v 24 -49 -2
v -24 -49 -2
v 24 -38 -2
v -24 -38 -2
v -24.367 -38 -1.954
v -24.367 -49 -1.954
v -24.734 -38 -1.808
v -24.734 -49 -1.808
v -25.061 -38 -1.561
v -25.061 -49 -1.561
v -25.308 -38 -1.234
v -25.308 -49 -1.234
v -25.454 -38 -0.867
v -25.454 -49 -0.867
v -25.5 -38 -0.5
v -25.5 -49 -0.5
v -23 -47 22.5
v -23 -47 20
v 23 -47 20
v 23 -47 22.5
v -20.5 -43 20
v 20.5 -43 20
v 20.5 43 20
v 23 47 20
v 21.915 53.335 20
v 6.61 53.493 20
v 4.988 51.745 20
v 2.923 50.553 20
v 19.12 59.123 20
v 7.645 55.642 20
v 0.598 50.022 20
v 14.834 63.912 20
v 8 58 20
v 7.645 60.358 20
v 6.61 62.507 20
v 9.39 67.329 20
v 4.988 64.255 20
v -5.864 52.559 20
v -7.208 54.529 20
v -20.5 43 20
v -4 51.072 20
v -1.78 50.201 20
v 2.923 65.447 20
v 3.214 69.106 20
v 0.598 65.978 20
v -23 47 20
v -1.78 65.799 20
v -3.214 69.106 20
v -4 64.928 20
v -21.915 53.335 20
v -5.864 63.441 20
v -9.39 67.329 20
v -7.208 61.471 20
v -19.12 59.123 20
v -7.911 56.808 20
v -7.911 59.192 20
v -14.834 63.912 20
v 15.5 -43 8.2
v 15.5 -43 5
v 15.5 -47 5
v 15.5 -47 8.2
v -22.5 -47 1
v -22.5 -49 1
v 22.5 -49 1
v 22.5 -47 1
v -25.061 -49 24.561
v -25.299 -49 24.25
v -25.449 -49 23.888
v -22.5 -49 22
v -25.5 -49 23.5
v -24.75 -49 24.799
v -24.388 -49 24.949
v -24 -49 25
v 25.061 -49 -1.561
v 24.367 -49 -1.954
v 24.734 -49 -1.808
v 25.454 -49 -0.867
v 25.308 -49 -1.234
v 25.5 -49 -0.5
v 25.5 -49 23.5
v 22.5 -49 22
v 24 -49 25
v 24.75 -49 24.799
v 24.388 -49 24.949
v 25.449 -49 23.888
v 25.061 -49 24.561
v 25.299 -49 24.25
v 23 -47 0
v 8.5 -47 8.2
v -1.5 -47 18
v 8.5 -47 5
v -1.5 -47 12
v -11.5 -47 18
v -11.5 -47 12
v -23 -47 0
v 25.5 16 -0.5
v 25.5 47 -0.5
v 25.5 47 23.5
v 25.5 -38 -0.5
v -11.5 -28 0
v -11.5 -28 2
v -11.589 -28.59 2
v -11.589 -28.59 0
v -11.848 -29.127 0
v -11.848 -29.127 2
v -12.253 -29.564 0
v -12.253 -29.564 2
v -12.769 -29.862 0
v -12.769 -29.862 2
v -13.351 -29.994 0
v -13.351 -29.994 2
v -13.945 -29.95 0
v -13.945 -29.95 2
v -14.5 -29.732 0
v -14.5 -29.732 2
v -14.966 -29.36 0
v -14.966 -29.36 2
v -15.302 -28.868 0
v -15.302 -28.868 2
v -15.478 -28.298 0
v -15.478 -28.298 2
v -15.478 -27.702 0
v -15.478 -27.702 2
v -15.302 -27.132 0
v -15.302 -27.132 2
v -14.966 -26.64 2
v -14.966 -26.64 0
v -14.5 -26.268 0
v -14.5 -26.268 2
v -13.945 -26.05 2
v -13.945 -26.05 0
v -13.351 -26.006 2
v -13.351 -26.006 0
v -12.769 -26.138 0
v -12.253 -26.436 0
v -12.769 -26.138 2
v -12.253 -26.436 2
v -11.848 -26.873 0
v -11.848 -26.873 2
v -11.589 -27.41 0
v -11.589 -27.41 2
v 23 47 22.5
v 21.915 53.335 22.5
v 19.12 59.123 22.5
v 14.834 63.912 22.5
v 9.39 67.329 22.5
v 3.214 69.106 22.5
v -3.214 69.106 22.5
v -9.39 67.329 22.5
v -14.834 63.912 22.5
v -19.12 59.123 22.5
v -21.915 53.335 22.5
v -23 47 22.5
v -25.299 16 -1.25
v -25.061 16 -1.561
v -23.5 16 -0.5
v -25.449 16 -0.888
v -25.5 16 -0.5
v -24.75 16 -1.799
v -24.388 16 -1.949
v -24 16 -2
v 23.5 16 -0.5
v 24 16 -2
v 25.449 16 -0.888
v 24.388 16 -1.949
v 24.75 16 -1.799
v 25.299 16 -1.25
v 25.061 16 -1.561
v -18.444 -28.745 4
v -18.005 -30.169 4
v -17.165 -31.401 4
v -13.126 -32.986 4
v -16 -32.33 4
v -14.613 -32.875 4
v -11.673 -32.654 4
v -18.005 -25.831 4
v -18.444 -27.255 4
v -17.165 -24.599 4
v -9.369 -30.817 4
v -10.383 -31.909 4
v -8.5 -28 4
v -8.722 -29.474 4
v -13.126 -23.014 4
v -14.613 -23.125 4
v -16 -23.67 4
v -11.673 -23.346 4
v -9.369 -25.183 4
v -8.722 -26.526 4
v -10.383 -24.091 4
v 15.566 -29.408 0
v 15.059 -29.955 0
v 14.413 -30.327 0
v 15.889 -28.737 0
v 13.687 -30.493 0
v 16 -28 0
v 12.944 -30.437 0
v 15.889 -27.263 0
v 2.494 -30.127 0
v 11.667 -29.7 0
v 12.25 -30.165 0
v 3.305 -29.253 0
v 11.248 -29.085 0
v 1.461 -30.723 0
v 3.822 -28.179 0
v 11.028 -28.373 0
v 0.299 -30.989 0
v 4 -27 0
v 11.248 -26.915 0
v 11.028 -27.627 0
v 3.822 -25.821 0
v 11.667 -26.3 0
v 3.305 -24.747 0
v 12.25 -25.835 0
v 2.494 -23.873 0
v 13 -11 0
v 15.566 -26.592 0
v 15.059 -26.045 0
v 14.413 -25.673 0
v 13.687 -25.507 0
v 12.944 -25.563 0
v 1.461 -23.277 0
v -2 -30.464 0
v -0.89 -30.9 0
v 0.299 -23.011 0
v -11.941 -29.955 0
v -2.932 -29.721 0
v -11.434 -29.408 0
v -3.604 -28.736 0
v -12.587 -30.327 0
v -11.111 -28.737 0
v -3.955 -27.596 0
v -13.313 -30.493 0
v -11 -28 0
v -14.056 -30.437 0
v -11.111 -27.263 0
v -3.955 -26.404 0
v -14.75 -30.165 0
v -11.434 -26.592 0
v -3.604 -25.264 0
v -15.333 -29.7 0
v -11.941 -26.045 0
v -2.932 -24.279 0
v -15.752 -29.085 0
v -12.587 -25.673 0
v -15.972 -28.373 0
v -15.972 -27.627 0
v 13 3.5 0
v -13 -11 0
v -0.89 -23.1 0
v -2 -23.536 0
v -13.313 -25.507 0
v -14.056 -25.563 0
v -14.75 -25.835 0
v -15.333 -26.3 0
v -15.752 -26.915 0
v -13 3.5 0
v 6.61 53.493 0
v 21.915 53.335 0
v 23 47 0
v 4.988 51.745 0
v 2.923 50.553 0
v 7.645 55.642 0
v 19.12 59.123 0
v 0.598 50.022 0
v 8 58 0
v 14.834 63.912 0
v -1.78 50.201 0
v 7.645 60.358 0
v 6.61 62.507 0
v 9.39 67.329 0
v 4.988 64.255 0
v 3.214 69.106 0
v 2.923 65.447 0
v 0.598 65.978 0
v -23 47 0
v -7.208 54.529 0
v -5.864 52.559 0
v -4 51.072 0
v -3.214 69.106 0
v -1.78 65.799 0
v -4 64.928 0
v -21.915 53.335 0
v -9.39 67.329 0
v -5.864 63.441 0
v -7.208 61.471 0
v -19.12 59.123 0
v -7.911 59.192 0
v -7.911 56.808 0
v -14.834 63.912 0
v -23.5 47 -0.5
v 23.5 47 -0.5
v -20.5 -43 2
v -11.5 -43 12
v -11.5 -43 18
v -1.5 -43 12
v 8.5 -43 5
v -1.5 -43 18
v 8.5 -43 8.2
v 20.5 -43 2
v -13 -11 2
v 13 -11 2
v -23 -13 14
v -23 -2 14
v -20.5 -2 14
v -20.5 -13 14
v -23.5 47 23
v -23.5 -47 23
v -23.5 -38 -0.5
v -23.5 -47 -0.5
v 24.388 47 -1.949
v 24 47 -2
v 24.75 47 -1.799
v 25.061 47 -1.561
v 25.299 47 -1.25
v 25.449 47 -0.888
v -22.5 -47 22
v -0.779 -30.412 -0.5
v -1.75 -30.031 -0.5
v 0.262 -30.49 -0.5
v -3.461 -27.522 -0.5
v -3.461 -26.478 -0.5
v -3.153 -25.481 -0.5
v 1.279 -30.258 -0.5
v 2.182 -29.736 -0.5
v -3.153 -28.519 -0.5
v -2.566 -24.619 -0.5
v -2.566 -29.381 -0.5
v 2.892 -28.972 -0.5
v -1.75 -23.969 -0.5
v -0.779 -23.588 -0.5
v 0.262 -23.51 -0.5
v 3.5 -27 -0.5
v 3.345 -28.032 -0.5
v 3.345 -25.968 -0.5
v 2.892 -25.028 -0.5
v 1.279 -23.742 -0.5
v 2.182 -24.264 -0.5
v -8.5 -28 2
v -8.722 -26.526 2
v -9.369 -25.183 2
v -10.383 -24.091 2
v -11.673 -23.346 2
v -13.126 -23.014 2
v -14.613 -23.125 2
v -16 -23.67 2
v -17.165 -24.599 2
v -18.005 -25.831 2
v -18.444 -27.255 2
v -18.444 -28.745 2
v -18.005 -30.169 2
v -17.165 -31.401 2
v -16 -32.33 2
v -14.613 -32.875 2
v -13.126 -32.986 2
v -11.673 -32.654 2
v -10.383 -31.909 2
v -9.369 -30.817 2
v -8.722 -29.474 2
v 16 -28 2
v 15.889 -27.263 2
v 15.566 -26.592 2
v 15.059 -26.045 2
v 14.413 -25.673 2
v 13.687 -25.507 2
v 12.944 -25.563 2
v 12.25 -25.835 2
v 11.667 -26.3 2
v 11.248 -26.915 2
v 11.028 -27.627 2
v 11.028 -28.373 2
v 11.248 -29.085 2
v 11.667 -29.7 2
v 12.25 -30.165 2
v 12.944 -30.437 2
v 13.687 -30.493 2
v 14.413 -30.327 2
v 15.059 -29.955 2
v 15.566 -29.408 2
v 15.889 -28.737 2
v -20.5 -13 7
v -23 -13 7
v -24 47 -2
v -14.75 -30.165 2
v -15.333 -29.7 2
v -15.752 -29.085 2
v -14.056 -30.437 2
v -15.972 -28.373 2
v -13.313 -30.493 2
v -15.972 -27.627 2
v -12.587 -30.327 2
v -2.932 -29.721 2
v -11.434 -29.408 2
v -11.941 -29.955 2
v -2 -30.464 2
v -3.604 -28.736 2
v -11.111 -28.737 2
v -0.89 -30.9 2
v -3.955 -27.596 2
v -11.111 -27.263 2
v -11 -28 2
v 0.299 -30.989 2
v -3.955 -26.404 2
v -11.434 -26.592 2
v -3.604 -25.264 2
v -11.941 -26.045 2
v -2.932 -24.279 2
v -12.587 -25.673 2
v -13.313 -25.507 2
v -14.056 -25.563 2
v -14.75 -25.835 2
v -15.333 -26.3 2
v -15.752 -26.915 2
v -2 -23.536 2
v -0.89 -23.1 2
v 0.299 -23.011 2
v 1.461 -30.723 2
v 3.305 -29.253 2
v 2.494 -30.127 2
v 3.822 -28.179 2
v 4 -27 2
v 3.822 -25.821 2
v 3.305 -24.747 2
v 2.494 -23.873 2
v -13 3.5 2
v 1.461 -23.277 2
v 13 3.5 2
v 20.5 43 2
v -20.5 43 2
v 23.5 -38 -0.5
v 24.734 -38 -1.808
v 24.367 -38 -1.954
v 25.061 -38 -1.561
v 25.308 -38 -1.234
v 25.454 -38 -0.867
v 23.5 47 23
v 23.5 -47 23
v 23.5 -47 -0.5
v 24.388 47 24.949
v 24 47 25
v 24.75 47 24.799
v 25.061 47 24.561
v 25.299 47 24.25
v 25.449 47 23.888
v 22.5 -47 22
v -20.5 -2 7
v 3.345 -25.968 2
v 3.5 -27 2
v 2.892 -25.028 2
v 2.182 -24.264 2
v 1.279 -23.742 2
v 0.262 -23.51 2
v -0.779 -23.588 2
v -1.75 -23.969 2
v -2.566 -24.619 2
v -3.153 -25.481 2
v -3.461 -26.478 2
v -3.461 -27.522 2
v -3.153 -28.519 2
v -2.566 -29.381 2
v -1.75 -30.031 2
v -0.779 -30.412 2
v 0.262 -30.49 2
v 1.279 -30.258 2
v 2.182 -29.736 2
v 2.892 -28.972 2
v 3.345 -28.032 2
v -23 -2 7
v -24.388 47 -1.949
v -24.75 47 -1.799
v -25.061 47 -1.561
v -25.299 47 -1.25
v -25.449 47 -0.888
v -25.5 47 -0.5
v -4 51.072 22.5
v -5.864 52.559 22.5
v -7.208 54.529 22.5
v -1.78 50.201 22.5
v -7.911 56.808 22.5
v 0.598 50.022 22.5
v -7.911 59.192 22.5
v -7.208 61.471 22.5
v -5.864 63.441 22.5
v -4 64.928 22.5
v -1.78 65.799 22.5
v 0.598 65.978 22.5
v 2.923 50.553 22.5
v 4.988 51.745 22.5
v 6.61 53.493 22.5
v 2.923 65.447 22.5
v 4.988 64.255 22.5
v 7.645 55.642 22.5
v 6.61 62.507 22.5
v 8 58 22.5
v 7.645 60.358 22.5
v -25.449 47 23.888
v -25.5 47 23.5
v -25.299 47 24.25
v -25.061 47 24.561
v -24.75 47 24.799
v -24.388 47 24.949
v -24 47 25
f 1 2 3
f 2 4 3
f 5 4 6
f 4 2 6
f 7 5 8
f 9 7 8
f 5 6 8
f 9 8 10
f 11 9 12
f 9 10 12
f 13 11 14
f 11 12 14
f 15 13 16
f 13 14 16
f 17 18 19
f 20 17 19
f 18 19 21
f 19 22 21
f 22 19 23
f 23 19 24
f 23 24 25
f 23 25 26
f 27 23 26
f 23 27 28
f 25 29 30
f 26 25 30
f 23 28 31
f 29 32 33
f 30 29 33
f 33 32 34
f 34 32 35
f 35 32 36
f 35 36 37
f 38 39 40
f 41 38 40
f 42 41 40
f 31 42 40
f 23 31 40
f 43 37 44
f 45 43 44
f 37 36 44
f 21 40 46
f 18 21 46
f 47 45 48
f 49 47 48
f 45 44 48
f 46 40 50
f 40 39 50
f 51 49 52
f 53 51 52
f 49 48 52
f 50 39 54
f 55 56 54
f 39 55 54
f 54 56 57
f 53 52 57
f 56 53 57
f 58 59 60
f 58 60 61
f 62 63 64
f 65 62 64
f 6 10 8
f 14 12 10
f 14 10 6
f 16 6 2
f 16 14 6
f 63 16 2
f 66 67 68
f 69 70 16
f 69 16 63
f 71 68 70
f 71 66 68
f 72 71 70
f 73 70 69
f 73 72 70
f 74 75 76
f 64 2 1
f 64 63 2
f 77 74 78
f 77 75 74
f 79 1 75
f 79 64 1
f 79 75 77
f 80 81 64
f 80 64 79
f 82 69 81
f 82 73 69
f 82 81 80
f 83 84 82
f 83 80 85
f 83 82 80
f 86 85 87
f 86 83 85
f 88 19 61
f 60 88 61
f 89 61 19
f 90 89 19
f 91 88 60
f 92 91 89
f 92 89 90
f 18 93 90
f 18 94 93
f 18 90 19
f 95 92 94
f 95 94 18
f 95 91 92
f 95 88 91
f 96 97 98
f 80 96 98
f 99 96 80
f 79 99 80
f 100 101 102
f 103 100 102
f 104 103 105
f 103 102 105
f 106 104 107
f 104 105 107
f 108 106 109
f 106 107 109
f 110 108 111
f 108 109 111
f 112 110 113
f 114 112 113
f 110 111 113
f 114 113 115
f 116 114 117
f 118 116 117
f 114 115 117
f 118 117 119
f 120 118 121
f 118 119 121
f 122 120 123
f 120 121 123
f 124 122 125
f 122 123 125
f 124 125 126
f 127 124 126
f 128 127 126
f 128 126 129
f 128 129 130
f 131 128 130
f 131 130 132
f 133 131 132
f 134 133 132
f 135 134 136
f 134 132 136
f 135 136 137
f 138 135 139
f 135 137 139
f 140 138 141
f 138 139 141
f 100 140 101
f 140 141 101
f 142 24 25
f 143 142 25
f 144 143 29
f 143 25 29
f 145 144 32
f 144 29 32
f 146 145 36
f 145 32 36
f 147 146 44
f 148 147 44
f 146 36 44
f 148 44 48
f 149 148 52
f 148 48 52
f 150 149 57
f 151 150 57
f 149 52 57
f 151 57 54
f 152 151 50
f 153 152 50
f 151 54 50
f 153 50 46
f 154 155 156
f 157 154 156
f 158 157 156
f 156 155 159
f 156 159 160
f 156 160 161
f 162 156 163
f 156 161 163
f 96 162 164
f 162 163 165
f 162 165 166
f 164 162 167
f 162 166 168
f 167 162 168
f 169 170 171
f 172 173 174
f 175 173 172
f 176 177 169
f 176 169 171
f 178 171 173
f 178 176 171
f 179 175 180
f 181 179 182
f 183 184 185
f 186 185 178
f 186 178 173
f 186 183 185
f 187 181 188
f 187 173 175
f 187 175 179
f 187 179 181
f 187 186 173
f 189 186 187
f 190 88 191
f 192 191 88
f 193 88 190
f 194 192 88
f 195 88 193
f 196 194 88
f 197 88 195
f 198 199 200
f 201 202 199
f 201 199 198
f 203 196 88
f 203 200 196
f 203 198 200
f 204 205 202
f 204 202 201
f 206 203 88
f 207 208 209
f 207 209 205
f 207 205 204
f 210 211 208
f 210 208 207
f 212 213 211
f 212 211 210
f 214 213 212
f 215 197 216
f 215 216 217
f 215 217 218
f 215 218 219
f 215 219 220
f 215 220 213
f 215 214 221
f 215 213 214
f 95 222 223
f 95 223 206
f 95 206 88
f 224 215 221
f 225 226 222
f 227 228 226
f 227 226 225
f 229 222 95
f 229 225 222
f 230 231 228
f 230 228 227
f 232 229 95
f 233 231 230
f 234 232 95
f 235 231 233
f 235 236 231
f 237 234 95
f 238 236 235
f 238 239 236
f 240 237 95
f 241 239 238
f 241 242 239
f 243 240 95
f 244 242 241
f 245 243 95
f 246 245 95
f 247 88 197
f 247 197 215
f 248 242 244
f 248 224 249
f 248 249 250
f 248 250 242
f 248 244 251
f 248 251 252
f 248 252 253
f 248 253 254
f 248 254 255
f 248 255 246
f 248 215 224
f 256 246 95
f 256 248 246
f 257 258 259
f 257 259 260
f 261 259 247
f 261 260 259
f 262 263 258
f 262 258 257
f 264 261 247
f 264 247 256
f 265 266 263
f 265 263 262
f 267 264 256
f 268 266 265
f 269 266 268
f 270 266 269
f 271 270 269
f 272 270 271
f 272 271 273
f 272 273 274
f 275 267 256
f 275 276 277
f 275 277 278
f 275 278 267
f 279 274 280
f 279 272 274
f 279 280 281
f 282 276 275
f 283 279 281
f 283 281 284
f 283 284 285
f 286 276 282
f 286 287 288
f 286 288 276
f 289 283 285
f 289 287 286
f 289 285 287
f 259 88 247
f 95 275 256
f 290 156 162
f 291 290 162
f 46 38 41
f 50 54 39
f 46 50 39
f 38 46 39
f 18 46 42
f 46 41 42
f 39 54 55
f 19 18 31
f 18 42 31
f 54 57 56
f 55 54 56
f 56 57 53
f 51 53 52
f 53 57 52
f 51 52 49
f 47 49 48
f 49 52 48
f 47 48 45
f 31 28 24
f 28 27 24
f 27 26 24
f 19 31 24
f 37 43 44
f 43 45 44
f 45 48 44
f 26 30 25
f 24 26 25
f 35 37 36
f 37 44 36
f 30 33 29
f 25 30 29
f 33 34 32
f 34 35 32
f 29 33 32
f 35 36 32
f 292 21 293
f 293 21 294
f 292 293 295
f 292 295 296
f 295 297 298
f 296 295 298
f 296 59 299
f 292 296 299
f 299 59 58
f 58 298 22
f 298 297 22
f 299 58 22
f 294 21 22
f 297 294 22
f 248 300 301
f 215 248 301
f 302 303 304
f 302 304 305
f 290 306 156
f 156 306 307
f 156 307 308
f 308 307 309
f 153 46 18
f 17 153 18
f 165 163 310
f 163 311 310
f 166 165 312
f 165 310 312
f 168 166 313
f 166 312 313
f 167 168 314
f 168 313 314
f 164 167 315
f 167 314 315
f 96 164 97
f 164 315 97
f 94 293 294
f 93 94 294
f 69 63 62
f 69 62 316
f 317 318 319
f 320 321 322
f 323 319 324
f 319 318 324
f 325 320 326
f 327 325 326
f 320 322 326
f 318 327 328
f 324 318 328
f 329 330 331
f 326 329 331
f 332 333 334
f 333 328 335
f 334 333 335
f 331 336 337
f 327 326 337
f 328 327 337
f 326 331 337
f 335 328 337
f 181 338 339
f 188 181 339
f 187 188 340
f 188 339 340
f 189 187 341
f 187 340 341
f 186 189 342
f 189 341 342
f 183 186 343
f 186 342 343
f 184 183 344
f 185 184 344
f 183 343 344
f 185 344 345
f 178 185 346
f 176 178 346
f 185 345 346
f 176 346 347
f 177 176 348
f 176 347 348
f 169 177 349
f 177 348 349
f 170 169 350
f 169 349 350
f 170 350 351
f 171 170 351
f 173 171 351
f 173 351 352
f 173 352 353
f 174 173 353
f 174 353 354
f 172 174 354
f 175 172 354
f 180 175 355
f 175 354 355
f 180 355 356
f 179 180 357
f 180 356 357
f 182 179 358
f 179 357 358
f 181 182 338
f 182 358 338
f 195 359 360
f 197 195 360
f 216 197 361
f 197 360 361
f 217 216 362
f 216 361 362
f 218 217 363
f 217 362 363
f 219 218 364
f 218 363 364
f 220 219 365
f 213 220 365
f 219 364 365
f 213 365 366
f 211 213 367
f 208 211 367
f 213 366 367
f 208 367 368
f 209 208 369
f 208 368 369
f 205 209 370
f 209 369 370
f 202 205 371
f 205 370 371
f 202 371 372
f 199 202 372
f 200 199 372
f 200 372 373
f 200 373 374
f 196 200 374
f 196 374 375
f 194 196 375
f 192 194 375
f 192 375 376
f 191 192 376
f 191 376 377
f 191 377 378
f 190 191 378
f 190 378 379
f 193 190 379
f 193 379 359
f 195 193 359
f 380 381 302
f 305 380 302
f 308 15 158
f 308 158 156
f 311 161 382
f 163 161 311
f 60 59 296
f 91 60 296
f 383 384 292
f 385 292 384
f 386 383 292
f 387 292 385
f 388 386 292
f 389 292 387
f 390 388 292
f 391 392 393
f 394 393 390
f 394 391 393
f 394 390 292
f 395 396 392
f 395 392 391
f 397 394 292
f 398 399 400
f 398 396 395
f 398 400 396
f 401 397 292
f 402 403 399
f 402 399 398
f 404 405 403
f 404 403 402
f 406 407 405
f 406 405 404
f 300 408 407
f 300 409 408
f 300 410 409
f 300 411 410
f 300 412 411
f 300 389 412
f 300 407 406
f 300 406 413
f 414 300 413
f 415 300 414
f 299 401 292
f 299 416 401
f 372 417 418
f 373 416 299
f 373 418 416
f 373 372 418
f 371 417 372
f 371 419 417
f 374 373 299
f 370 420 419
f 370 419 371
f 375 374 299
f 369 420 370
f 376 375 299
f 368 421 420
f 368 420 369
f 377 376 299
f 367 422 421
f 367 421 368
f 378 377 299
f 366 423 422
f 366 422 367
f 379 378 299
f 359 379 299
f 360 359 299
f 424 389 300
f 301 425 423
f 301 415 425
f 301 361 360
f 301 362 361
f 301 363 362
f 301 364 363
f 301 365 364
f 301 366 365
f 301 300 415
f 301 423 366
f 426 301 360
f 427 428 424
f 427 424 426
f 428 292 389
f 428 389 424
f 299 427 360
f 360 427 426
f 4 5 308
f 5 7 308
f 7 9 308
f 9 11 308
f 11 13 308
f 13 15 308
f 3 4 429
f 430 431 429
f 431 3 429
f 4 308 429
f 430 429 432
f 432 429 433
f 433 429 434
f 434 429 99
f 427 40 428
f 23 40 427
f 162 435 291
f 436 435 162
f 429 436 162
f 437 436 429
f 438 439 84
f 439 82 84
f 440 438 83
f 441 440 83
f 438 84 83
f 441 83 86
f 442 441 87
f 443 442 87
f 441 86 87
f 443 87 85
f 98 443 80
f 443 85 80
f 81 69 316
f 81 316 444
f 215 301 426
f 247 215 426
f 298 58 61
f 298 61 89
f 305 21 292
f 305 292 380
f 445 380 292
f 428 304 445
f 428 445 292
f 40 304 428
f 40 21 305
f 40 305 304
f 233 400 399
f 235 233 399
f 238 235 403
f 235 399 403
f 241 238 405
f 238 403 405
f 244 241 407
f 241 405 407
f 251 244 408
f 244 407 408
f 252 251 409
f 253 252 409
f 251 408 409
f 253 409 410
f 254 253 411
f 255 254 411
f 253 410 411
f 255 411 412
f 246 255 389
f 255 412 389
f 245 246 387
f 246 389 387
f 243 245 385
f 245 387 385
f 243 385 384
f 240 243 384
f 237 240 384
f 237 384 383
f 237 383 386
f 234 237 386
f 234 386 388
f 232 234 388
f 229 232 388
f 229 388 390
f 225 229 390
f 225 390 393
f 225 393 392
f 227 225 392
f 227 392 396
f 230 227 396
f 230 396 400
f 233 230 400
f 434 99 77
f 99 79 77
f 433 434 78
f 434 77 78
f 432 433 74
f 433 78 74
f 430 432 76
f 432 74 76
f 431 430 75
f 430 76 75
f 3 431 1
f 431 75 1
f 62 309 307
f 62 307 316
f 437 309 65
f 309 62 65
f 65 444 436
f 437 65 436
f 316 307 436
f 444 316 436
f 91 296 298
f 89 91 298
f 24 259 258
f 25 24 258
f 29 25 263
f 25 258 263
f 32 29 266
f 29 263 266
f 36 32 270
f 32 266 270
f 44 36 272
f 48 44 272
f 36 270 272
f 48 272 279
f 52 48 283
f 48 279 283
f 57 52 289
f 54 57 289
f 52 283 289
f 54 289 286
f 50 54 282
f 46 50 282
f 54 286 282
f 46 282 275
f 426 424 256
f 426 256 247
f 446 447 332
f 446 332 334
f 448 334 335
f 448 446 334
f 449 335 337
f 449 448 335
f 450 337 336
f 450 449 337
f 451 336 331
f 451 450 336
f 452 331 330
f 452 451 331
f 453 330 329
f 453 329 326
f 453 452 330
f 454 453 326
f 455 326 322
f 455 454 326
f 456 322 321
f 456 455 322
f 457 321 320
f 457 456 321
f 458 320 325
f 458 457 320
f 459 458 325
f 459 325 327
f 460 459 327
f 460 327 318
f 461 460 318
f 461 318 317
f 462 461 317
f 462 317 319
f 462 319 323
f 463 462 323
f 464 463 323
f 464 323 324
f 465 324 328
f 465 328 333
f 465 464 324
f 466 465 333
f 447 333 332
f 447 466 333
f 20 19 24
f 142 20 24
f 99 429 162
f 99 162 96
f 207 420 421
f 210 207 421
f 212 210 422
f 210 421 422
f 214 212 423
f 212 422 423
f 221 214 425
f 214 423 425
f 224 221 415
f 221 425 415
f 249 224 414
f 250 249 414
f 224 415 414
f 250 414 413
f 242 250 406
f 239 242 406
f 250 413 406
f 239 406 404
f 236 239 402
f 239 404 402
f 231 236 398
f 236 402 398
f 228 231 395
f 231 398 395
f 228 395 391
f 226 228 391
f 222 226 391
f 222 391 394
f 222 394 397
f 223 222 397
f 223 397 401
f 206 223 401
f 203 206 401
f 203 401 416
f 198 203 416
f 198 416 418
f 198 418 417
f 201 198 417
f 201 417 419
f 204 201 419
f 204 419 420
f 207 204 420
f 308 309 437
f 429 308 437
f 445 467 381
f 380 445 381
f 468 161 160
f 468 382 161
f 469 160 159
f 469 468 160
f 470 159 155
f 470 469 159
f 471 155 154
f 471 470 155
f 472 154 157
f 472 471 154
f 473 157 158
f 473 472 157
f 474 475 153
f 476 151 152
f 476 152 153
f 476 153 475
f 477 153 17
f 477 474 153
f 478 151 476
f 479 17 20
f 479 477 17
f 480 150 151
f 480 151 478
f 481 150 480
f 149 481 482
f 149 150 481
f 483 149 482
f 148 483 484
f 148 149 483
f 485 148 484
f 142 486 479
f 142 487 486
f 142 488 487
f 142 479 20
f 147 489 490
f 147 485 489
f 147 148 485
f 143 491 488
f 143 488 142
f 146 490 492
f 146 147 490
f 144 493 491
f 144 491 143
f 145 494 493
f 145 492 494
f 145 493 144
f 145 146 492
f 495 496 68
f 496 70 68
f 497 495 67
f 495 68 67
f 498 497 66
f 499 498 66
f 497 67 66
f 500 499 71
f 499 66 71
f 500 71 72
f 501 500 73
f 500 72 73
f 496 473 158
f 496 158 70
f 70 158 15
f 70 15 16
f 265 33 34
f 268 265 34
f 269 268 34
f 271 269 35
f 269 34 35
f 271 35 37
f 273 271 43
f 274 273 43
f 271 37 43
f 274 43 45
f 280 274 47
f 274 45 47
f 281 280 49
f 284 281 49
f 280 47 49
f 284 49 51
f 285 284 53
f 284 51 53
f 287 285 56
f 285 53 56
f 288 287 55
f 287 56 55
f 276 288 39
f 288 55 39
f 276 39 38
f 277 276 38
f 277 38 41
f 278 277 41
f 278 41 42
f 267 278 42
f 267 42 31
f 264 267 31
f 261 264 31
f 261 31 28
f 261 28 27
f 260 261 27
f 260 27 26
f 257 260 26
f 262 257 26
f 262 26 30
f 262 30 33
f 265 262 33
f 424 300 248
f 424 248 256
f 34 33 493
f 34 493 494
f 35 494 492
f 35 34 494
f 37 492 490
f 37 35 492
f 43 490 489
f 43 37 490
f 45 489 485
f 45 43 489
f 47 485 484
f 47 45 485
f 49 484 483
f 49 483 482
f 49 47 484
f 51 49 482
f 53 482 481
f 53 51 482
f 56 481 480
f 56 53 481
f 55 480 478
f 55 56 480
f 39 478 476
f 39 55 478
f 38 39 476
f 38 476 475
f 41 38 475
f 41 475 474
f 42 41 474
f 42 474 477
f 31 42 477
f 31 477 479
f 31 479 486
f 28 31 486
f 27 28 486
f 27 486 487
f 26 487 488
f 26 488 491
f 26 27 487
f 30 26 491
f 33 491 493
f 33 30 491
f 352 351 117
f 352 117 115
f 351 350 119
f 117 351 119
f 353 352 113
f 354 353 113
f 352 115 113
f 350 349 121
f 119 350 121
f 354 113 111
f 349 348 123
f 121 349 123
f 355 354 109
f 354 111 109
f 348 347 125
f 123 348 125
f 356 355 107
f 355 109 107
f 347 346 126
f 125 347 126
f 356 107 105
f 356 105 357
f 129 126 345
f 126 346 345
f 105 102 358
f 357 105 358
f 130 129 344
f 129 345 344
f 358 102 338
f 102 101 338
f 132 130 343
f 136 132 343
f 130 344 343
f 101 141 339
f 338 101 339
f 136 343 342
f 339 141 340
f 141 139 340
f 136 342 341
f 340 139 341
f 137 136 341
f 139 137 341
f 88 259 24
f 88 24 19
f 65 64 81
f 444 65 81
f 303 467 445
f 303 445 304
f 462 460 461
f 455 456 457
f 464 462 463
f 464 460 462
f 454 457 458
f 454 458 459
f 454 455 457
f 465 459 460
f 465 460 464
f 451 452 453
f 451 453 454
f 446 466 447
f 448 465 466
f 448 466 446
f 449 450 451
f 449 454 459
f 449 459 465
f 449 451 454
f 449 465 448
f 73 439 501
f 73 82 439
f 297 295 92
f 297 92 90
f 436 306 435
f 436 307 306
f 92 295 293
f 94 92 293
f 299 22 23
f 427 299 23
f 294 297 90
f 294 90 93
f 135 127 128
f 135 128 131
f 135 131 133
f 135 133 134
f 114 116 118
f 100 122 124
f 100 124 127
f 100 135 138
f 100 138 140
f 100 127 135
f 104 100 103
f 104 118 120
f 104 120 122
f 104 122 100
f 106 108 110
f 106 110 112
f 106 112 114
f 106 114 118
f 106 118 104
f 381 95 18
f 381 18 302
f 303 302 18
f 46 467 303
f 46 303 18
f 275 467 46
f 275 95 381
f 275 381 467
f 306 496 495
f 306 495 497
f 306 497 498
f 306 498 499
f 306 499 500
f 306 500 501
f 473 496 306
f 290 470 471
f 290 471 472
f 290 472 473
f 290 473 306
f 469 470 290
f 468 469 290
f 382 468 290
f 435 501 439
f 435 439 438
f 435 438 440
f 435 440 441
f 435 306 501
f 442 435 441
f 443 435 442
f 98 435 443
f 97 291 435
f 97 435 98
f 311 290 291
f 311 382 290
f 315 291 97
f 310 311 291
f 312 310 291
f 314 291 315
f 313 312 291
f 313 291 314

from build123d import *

# Parameters (mm, degrees)
PAD_DEPTH       = 20
SKETCH001_R     = 8
POCKET_DEPTH    = 20.001
SKETCH002_W     = 41
SKETCH002_H     = 86
POCKET001_DEPTH = 18
SKETCH003_W     = 26
SKETCH003_H     = 14.5
POCKET002_DEPTH = 5
SKETCH004_R     = 4
POCKET003_DEPTH = 5
SKETCH005_W     = 7
SKETCH005_H     = 3.2
POCKET004_DEPTH = 4.001
SKETCH006_W     = 10
SKETCH006_H     = 6
POCKET005_DEPTH = 4.001
SKETCH007_R     = 2.5
POCKET006_DEPTH = 2.001
SKETCH012_R     = 2.5
POCKET007_DEPTH = 2.001
SKETCH013_W     = 11
SKETCH013_H     = 7
POCKET008_DEPTH = 2.5
SKETCH008_R     = 5
PAD001_DEPTH    = 2
SKETCH009_R     = 2
PAD002_DEPTH    = 2
SKETCH010_R     = 3.5
PAD003_DEPTH    = 2.5
SKETCH014_R     = 8
PAD005_DEPTH    = 2.5
SKETCH015_W     = 51
SKETCH015_H     = 27
SKETCH015_W_2   = 47
SKETCH015_H_2   = 23.5
PAD006_DEPTH    = 9
SKETCH016_W     = 51
SKETCH016_H     = 27
PAD007_DEPTH    = 2
SKETCH017_W     = 2
SKETCH017_H     = 23.5
PAD008_DEPTH    = 54
SKETCH018_W     = 51
SKETCH018_H     = 27
SKETCH018_W_2   = 47
SKETCH018_H_2   = 23.5
PAD009_DEPTH    = 31
SKETCH019_W     = 51
SKETCH019_H     = 54
PAD010_DEPTH    = 2
SKETCH020_W     = 45
SKETCH020_H     = 21
POCKET009_DEPTH = 5
FILLET_R        = 1.5
FILLET001_R     = 1.5
FILLET002_R     = 1.5
FILLET003_R     = 1.5
FILLET004_R     = 1.5
FILLET005_R     = 1.5


with BuildPart() as body:
    # Sketch → Pad (new body)
    with BuildSketch(Plane.XY):
        with BuildLine():
            Line((23, 47), (23, -47))
            Line((23, -47), (-23, -47))
            Line((-23, -47), (-23, 47))
            ThreePointArc((23, 47), (0, 69.331693), (-23, 47))
        make_face()
    extrude(amount=PAD_DEPTH)

    # Sketch001 (on Face6 of Pad) → Pocket (cut, through all)
    with BuildSketch(Plane.XY.offset(20)):
        with Locations((0, 58)):
            Circle(SKETCH001_R)
    extrude(amount=-POCKET_DEPTH, mode=Mode.SUBTRACT)

    # Sketch002 (on Face5 of Pocket) → Pocket001 (cut)
    with BuildSketch(Plane.XY.offset(20)):
        Rectangle(SKETCH002_W, SKETCH002_H)
    extrude(amount=-POCKET001_DEPTH, mode=Mode.SUBTRACT)

    # Sketch003 (on Face12 of Pocket001) → Pocket002 (cut)
    with BuildSketch(Plane.XY.offset(2)):
        with Locations((0, -3.75)):
            Rectangle(SKETCH003_W, SKETCH003_H)
    extrude(amount=-POCKET002_DEPTH, mode=Mode.SUBTRACT)

    # Sketch004 (on Face16 of Pocket002) → Pocket003 (cut)
    with BuildSketch(Plane.XY.offset(2)):
        with Locations((0, -27)):
            Circle(SKETCH004_R)
    extrude(amount=-POCKET003_DEPTH, mode=Mode.SUBTRACT)

    # Sketch005 (on Face15 of Pocket003) → Pocket004 (cut, through all)
    with BuildSketch(Plane(origin=(0, -43, 0), x_dir=(-1, 0, 0), z_dir=(0, 1, 0))):
        with Locations((-12, 6.6)):
            Rectangle(SKETCH005_W, SKETCH005_H)
    extrude(amount=-POCKET004_DEPTH, mode=Mode.SUBTRACT)

    # Sketch006 (on Face19 of Pocket004) → Pocket005 (cut, through all)
    with BuildSketch(Plane(origin=(0, -43, 0), x_dir=(-1, 0, 0), z_dir=(0, 1, 0))):
        with Locations((6.5, 15)):
            Rectangle(SKETCH006_W, SKETCH006_H)
    extrude(amount=-POCKET005_DEPTH, mode=Mode.SUBTRACT)

    # Sketch007 (on Face25 of Pocket005) → Pocket006 (cut, through all)
    with BuildSketch(Plane.XY.offset(2)):
        with Locations((-13.5, -28)):
            Circle(SKETCH007_R)
    extrude(amount=-POCKET006_DEPTH, mode=Mode.SUBTRACT)

    # Sketch012 (on Face26 of Pocket006) → Pocket007 (cut, through all)
    with BuildSketch(Plane.XY.offset(2)):
        with Locations((13.5, -28)):
            Circle(SKETCH012_R)
    extrude(amount=-POCKET007_DEPTH, mode=Mode.SUBTRACT)

    # Sketch013 (on Face6 of Pocket007) → Pocket008 (cut)
    with BuildSketch(Plane(origin=(-23, 0, 0), x_dir=(0, -1, 0), z_dir=(-1, 0, 0))):
        with Locations((7.5, 10.5)):
            Rectangle(SKETCH013_W, SKETCH013_H)
    extrude(amount=-POCKET008_DEPTH, mode=Mode.SUBTRACT)


with BuildPart() as leddiffuser:
    # Sketch008 (on DatumPlane) → Pad001 (new body)
    with BuildSketch(Plane.XY.offset(2)):
        with Locations((-13.5, -28)):
            Circle(SKETCH008_R)
    extrude(amount=PAD001_DEPTH)

    # Sketch009 (on Face2 of Pad001) → Pad002 (join)
    with BuildSketch(Plane(origin=(0, 0, 2), x_dir=(1, 0, 0), z_dir=(0, 0, -1))):
        with Locations((-13.5, 28)):
            Circle(SKETCH009_R)
    extrude(amount=PAD002_DEPTH)


with BuildPart() as button:
    # Sketch010 (on DatumPlane) → Pad003 (new body)
    with BuildSketch(Plane.XY.offset(2)):
        with Locations((0, -27)):
            Circle(SKETCH010_R)
    extrude(amount=-PAD003_DEPTH)


with BuildPart() as backplate:
    # Sketch014 (on DatumPlane) → Pad005 (new body)
    with BuildSketch(Plane.XY.offset(20)):
        with BuildLine():
            Line((-23, 47), (-23, -47))
            Line((-23, -47), (23, -47))
            Line((23, -47), (23, 47))
            ThreePointArc((23, 47), (0, 69.331693), (-23, 47))
        make_face()
        with Locations((0, 58)):
            Circle(SKETCH014_R, mode=Mode.SUBTRACT)
    extrude(amount=PAD005_DEPTH)


with BuildPart() as sleeve:
    # Sketch015 (on DatumPlane) → Pad006 (new body)
    with BuildSketch(Plane.XZ.offset(47)):
        with Locations((0, 11.5)):
            Rectangle(SKETCH015_W, SKETCH015_H)
        with Locations((0, 11.25)):
            Rectangle(SKETCH015_W_2, SKETCH015_H_2, mode=Mode.SUBTRACT)
    extrude(amount=-PAD006_DEPTH)

    # Sketch016 (on DatumPlane) → Pad007 (join)
    with BuildSketch(Plane.XZ.offset(47)):
        with Locations((0, 11.5)):
            Rectangle(SKETCH016_W, SKETCH016_H)
    extrude(amount=PAD007_DEPTH)

    # Sketch017 (on Face5 of Pad007) → Pad008 (join)
    with BuildSketch(Plane(origin=(0, -38, 0), x_dir=(1, 0, 0), z_dir=(0, 1, 0))):
        with Locations((24.5, -11.25)):
            Rectangle(SKETCH017_W, SKETCH017_H)
        with Locations((-24.5, -11.25)):
            Rectangle(SKETCH017_W, SKETCH017_H)
    extrude(amount=PAD008_DEPTH)

    # Sketch018 (on Face20 of Pad008) → Pad009 (join)
    with BuildSketch(Plane(origin=(0, 16, 0), x_dir=(1, 0, 0), z_dir=(0, 1, 0))):
        with Locations((0, -11.5)):
            Rectangle(SKETCH018_W, SKETCH018_H)
        with Locations((0, -11.25)):
            Rectangle(SKETCH018_W_2, SKETCH018_H_2, mode=Mode.SUBTRACT)
    extrude(amount=PAD009_DEPTH)

    # Sketch019 (on Face13 of Pad009) → Pad010 (join)
    with BuildSketch(Plane(origin=(0, -47, 23), x_dir=(-1, 0, 0), z_dir=(0, 0, 1))):
        with Locations((0, -36)):
            Rectangle(SKETCH019_W, SKETCH019_H)
    extrude(amount=PAD010_DEPTH)

    # Sketch020 (on Face14 of Pad010) → Pocket009 (cut)
    with BuildSketch(Plane.XZ.offset(49)):
        with Locations((0, 11.5)):
            Rectangle(SKETCH020_W, SKETCH020_H)
    extrude(amount=-POCKET009_DEPTH, mode=Mode.SUBTRACT)

    # Fillet
    fillet_edges = [sleeve.edges().sort_by_distance(p)[0] for p in [
        (-25.5, 31.5, -2),
    ]]
    fillet(fillet_edges, radius=FILLET_R)

    # Fillet001
    fillet001_edges = [sleeve.edges().sort_by_distance(p)[0] for p in [
        (25.5, 31.5, -2),
    ]]
    fillet(fillet001_edges, radius=FILLET001_R)

    # Fillet002
    fillet002_edges = [sleeve.edges().sort_by_distance(p)[0] for p in [
        (-25.5, 31.5, 25),
    ]]
    fillet(fillet002_edges, radius=FILLET002_R)

    # Fillet003
    fillet003_edges = [sleeve.edges().sort_by_distance(p)[0] for p in [
        (25.5, 31.5, 25),
    ]]
    fillet(fillet003_edges, radius=FILLET003_R)

    # Fillet004
    fillet004_edges = [sleeve.edges().sort_by_distance(p)[0] for p in [
        (25.5, -42.5, -2),
    ]]
    fillet(fillet004_edges, radius=FILLET004_R)

    # Fillet005
    fillet005_edges = [sleeve.edges().sort_by_distance(p)[0] for p in [
        (-25.5, -42.5, -2),
    ]]
    fillet(fillet005_edges, radius=FILLET005_R)


solid = Compound([body.part, leddiffuser.part, button.part, backplate.part, sleeve.part])
